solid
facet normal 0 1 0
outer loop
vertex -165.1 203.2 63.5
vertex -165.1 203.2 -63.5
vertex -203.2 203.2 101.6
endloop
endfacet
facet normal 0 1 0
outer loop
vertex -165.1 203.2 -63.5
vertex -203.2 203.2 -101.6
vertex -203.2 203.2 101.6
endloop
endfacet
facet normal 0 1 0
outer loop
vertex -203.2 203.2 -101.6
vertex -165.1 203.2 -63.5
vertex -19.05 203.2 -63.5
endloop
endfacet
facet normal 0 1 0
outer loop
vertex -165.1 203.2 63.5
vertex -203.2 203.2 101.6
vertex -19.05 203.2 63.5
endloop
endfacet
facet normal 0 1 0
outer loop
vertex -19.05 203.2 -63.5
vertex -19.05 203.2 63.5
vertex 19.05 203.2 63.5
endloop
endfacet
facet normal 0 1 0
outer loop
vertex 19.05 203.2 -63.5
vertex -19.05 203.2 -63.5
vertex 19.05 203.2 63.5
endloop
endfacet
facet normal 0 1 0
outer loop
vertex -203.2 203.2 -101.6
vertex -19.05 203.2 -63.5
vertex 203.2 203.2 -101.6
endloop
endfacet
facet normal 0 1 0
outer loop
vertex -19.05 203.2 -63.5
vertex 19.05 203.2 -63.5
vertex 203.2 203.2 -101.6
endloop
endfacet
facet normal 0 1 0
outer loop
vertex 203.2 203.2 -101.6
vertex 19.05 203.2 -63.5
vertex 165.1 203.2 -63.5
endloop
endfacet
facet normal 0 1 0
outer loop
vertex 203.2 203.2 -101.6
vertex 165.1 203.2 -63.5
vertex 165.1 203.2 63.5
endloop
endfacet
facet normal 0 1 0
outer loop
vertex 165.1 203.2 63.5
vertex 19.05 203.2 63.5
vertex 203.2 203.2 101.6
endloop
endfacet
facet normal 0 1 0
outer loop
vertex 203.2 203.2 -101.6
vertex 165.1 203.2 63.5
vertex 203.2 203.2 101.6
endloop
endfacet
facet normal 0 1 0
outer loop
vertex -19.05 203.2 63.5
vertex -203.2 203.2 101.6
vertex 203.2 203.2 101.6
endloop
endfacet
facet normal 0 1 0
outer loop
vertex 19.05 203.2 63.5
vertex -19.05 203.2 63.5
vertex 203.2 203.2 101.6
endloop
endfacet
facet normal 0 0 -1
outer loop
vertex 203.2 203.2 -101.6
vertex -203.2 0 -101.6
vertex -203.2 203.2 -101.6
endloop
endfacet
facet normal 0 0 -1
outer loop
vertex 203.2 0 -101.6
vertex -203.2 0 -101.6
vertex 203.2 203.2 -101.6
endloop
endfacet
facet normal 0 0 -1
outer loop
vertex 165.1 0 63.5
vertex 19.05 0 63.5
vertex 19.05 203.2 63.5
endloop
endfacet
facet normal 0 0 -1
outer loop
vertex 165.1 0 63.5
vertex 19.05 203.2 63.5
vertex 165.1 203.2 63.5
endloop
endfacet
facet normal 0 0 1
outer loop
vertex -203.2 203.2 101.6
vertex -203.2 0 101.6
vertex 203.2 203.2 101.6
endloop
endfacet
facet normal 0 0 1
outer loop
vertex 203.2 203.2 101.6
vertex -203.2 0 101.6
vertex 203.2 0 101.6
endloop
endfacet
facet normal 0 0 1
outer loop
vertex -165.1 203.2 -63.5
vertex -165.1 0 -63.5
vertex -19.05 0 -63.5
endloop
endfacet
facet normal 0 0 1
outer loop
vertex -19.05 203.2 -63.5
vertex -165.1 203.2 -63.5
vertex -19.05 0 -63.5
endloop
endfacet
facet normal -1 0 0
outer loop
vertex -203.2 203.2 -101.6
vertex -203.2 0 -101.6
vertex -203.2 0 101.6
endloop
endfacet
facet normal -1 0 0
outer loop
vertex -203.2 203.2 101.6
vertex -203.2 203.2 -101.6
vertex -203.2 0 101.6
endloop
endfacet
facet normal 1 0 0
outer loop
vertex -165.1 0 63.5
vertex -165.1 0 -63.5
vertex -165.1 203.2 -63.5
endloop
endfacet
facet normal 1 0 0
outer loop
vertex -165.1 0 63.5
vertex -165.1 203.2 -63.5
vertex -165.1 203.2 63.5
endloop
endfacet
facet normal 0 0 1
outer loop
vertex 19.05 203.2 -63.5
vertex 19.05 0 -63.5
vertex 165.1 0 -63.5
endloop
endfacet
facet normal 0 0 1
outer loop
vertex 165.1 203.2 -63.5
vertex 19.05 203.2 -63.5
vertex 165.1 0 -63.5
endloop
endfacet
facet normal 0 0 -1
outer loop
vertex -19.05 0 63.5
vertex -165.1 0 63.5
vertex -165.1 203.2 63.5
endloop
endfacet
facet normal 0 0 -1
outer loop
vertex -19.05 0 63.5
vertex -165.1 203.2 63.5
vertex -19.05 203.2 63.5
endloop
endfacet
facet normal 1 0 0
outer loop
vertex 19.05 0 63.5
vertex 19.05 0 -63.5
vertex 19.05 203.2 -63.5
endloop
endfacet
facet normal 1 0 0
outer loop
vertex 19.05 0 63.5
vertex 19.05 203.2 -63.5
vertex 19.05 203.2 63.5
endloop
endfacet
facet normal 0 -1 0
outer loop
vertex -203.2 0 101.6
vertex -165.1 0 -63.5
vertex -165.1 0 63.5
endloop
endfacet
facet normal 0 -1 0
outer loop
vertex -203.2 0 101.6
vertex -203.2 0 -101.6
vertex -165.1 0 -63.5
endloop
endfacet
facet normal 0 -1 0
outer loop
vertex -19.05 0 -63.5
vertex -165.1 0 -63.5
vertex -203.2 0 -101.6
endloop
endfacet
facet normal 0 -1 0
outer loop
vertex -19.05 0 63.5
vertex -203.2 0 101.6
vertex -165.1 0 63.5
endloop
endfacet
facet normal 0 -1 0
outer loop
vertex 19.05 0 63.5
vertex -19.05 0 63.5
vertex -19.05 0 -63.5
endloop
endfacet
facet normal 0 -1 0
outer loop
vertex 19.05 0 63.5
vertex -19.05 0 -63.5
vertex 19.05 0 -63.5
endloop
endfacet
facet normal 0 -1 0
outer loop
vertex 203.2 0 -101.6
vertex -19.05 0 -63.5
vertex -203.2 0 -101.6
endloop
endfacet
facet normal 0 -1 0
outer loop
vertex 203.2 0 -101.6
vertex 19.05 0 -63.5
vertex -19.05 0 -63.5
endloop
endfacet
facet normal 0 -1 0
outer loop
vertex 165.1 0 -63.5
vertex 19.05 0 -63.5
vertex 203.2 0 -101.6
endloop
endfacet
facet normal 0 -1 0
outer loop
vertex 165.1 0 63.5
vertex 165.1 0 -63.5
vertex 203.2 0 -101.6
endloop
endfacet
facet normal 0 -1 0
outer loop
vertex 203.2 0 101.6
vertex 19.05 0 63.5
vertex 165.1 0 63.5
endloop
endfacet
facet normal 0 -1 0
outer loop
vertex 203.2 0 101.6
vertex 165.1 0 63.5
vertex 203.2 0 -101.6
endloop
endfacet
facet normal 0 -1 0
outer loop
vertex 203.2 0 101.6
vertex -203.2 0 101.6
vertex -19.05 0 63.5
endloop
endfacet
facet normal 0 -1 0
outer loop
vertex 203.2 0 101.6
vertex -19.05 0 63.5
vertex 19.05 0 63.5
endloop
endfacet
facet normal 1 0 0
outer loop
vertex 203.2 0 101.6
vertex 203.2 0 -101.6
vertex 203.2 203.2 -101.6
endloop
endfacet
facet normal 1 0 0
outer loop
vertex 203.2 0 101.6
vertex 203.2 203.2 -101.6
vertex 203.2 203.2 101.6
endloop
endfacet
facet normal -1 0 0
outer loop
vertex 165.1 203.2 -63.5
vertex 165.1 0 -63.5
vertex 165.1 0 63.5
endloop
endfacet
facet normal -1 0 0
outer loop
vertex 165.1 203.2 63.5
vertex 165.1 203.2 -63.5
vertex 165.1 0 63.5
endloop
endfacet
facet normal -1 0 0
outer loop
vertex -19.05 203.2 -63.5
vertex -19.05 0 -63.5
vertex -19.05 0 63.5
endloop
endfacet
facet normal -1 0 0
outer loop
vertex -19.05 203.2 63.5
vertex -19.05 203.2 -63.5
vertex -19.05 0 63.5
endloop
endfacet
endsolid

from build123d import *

# Parameters (mm, degrees)
F0_W     = 406.4
F0_H     = 203.2
F0_W_2   = 146.05
F0_H_2   = 127
F1_DEPTH = 203.2


with BuildPart() as f1:
    # F0 (on Front) → F1 (new body)
    with BuildSketch(Plane.XZ):
        Rectangle(F0_W, F0_H)
        with Locations((-92.075, 0)):
            Rectangle(F0_W_2, F0_H_2, mode=Mode.SUBTRACT)
        with Locations((92.075, 0)):
            Rectangle(F0_W_2, F0_H_2, mode=Mode.SUBTRACT)
    extrude(amount=-F1_DEPTH)


solid = f1.part
